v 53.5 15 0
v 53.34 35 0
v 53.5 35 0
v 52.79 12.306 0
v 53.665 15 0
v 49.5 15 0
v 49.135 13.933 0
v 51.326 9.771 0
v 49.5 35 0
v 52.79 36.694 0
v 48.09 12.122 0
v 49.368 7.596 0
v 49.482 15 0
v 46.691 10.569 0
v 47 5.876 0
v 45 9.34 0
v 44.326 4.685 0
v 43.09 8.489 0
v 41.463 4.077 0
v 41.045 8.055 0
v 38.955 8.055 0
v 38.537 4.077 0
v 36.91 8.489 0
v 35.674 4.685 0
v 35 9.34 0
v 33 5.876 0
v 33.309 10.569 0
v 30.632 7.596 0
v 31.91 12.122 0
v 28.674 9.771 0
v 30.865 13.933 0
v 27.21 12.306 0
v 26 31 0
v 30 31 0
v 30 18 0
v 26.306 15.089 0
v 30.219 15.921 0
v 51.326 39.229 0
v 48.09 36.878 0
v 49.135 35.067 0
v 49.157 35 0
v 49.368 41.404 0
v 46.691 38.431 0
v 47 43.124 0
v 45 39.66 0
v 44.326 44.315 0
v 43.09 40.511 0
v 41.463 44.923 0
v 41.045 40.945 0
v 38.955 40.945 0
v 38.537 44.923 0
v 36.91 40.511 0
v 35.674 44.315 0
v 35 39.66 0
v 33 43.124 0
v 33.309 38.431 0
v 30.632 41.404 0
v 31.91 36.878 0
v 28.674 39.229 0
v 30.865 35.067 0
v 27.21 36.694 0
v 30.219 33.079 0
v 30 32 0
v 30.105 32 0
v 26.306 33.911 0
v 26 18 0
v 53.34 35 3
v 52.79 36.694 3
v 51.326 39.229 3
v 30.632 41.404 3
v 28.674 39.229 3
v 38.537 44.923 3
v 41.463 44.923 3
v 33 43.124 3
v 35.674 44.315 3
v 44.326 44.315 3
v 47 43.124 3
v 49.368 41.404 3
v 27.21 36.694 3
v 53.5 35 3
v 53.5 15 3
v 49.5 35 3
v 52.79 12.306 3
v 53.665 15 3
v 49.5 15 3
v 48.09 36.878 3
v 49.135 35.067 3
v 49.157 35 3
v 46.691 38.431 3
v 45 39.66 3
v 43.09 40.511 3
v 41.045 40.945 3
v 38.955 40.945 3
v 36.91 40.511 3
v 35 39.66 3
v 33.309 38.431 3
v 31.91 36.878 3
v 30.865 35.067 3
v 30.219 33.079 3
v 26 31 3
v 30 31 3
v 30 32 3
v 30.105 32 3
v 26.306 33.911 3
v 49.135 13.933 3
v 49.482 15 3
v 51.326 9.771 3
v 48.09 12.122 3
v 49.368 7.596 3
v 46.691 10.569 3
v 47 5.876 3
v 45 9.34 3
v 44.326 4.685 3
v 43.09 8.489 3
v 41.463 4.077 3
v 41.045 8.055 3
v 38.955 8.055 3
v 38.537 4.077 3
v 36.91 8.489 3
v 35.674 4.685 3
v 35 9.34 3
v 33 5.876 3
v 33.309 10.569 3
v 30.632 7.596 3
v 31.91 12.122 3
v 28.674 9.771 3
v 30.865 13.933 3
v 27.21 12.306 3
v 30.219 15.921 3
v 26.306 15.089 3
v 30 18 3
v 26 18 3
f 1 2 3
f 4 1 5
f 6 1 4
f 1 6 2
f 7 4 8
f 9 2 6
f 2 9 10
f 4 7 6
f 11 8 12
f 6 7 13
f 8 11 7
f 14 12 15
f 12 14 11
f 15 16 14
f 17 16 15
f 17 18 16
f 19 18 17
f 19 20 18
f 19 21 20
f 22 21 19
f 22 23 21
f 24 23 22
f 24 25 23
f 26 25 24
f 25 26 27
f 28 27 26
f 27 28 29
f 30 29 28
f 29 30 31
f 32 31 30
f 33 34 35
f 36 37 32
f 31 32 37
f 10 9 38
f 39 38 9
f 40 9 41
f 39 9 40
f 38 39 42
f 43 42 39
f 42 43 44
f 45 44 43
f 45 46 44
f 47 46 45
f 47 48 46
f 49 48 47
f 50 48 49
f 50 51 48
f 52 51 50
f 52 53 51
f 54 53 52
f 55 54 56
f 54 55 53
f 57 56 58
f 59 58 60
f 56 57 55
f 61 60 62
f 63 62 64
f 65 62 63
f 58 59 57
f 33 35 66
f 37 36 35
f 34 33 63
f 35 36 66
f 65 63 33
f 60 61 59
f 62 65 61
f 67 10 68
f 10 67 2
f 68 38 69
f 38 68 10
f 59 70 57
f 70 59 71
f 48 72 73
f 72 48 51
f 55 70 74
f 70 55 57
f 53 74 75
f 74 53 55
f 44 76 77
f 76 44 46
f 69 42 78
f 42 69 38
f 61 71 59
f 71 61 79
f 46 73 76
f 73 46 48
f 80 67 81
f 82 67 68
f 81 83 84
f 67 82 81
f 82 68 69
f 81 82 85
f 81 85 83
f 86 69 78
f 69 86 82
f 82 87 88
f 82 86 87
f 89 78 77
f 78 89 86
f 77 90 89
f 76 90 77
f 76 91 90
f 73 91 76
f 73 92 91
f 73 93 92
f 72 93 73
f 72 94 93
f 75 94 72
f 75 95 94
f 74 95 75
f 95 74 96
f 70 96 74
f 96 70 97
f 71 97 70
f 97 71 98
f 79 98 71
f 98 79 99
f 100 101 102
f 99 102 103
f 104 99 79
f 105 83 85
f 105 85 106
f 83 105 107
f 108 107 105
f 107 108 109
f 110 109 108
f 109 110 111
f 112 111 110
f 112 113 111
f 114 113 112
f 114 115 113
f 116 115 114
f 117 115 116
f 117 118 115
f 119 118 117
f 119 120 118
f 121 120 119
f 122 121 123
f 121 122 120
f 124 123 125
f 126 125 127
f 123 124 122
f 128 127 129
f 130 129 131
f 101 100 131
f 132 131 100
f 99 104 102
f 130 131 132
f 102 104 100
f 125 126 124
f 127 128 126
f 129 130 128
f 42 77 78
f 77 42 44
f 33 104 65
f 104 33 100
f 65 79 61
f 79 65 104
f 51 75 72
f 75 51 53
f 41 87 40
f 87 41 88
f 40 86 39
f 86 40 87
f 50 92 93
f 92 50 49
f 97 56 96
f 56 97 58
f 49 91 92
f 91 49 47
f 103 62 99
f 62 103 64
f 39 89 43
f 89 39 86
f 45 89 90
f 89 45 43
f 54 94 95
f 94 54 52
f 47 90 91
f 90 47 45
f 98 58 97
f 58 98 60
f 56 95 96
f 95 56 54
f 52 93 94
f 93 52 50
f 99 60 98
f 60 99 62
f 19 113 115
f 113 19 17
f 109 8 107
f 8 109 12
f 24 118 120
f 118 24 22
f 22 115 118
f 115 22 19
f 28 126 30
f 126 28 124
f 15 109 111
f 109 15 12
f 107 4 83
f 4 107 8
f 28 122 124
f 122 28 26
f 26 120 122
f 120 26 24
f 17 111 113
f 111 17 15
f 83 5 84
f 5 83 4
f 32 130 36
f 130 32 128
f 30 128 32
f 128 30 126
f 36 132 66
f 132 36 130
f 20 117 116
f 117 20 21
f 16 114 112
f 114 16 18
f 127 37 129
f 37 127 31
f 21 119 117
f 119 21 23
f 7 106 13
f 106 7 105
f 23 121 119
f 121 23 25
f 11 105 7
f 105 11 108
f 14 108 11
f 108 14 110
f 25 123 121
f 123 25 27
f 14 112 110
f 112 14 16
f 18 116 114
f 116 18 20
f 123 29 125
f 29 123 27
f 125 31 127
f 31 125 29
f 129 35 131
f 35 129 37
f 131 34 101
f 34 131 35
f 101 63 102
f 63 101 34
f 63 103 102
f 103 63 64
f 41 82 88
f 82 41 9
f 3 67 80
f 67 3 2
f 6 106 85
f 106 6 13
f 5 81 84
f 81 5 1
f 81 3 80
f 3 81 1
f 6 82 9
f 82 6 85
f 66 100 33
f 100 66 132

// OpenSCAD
//О
translate([0,5,0])
union(){
  translate([49.5,10,0]) cube([4,20,3]);
  translate([26,13,0]) cube([4,13,3]);
difference(){
union(){
	
  difference(){
  translate([40,26,0]) cylinder(3,14,14);
  translate([40,26,-1]) cylinder(5,10,10);
  translate([33,10,-1]) cube([20,10,5]);

}

difference(){
  translate([40,13,0]) cylinder(3,14,14);
  translate([40,13,-1]) cylinder(5,10,10);
  translate([32,17,-1]) cube([19,10,5]);
  translate([40,17,-1]) cube(20);
}
}
  translate([30,13,-1]) cube([5,14,5]);
  translate([42,10,-1]) cube(20);
}
}
